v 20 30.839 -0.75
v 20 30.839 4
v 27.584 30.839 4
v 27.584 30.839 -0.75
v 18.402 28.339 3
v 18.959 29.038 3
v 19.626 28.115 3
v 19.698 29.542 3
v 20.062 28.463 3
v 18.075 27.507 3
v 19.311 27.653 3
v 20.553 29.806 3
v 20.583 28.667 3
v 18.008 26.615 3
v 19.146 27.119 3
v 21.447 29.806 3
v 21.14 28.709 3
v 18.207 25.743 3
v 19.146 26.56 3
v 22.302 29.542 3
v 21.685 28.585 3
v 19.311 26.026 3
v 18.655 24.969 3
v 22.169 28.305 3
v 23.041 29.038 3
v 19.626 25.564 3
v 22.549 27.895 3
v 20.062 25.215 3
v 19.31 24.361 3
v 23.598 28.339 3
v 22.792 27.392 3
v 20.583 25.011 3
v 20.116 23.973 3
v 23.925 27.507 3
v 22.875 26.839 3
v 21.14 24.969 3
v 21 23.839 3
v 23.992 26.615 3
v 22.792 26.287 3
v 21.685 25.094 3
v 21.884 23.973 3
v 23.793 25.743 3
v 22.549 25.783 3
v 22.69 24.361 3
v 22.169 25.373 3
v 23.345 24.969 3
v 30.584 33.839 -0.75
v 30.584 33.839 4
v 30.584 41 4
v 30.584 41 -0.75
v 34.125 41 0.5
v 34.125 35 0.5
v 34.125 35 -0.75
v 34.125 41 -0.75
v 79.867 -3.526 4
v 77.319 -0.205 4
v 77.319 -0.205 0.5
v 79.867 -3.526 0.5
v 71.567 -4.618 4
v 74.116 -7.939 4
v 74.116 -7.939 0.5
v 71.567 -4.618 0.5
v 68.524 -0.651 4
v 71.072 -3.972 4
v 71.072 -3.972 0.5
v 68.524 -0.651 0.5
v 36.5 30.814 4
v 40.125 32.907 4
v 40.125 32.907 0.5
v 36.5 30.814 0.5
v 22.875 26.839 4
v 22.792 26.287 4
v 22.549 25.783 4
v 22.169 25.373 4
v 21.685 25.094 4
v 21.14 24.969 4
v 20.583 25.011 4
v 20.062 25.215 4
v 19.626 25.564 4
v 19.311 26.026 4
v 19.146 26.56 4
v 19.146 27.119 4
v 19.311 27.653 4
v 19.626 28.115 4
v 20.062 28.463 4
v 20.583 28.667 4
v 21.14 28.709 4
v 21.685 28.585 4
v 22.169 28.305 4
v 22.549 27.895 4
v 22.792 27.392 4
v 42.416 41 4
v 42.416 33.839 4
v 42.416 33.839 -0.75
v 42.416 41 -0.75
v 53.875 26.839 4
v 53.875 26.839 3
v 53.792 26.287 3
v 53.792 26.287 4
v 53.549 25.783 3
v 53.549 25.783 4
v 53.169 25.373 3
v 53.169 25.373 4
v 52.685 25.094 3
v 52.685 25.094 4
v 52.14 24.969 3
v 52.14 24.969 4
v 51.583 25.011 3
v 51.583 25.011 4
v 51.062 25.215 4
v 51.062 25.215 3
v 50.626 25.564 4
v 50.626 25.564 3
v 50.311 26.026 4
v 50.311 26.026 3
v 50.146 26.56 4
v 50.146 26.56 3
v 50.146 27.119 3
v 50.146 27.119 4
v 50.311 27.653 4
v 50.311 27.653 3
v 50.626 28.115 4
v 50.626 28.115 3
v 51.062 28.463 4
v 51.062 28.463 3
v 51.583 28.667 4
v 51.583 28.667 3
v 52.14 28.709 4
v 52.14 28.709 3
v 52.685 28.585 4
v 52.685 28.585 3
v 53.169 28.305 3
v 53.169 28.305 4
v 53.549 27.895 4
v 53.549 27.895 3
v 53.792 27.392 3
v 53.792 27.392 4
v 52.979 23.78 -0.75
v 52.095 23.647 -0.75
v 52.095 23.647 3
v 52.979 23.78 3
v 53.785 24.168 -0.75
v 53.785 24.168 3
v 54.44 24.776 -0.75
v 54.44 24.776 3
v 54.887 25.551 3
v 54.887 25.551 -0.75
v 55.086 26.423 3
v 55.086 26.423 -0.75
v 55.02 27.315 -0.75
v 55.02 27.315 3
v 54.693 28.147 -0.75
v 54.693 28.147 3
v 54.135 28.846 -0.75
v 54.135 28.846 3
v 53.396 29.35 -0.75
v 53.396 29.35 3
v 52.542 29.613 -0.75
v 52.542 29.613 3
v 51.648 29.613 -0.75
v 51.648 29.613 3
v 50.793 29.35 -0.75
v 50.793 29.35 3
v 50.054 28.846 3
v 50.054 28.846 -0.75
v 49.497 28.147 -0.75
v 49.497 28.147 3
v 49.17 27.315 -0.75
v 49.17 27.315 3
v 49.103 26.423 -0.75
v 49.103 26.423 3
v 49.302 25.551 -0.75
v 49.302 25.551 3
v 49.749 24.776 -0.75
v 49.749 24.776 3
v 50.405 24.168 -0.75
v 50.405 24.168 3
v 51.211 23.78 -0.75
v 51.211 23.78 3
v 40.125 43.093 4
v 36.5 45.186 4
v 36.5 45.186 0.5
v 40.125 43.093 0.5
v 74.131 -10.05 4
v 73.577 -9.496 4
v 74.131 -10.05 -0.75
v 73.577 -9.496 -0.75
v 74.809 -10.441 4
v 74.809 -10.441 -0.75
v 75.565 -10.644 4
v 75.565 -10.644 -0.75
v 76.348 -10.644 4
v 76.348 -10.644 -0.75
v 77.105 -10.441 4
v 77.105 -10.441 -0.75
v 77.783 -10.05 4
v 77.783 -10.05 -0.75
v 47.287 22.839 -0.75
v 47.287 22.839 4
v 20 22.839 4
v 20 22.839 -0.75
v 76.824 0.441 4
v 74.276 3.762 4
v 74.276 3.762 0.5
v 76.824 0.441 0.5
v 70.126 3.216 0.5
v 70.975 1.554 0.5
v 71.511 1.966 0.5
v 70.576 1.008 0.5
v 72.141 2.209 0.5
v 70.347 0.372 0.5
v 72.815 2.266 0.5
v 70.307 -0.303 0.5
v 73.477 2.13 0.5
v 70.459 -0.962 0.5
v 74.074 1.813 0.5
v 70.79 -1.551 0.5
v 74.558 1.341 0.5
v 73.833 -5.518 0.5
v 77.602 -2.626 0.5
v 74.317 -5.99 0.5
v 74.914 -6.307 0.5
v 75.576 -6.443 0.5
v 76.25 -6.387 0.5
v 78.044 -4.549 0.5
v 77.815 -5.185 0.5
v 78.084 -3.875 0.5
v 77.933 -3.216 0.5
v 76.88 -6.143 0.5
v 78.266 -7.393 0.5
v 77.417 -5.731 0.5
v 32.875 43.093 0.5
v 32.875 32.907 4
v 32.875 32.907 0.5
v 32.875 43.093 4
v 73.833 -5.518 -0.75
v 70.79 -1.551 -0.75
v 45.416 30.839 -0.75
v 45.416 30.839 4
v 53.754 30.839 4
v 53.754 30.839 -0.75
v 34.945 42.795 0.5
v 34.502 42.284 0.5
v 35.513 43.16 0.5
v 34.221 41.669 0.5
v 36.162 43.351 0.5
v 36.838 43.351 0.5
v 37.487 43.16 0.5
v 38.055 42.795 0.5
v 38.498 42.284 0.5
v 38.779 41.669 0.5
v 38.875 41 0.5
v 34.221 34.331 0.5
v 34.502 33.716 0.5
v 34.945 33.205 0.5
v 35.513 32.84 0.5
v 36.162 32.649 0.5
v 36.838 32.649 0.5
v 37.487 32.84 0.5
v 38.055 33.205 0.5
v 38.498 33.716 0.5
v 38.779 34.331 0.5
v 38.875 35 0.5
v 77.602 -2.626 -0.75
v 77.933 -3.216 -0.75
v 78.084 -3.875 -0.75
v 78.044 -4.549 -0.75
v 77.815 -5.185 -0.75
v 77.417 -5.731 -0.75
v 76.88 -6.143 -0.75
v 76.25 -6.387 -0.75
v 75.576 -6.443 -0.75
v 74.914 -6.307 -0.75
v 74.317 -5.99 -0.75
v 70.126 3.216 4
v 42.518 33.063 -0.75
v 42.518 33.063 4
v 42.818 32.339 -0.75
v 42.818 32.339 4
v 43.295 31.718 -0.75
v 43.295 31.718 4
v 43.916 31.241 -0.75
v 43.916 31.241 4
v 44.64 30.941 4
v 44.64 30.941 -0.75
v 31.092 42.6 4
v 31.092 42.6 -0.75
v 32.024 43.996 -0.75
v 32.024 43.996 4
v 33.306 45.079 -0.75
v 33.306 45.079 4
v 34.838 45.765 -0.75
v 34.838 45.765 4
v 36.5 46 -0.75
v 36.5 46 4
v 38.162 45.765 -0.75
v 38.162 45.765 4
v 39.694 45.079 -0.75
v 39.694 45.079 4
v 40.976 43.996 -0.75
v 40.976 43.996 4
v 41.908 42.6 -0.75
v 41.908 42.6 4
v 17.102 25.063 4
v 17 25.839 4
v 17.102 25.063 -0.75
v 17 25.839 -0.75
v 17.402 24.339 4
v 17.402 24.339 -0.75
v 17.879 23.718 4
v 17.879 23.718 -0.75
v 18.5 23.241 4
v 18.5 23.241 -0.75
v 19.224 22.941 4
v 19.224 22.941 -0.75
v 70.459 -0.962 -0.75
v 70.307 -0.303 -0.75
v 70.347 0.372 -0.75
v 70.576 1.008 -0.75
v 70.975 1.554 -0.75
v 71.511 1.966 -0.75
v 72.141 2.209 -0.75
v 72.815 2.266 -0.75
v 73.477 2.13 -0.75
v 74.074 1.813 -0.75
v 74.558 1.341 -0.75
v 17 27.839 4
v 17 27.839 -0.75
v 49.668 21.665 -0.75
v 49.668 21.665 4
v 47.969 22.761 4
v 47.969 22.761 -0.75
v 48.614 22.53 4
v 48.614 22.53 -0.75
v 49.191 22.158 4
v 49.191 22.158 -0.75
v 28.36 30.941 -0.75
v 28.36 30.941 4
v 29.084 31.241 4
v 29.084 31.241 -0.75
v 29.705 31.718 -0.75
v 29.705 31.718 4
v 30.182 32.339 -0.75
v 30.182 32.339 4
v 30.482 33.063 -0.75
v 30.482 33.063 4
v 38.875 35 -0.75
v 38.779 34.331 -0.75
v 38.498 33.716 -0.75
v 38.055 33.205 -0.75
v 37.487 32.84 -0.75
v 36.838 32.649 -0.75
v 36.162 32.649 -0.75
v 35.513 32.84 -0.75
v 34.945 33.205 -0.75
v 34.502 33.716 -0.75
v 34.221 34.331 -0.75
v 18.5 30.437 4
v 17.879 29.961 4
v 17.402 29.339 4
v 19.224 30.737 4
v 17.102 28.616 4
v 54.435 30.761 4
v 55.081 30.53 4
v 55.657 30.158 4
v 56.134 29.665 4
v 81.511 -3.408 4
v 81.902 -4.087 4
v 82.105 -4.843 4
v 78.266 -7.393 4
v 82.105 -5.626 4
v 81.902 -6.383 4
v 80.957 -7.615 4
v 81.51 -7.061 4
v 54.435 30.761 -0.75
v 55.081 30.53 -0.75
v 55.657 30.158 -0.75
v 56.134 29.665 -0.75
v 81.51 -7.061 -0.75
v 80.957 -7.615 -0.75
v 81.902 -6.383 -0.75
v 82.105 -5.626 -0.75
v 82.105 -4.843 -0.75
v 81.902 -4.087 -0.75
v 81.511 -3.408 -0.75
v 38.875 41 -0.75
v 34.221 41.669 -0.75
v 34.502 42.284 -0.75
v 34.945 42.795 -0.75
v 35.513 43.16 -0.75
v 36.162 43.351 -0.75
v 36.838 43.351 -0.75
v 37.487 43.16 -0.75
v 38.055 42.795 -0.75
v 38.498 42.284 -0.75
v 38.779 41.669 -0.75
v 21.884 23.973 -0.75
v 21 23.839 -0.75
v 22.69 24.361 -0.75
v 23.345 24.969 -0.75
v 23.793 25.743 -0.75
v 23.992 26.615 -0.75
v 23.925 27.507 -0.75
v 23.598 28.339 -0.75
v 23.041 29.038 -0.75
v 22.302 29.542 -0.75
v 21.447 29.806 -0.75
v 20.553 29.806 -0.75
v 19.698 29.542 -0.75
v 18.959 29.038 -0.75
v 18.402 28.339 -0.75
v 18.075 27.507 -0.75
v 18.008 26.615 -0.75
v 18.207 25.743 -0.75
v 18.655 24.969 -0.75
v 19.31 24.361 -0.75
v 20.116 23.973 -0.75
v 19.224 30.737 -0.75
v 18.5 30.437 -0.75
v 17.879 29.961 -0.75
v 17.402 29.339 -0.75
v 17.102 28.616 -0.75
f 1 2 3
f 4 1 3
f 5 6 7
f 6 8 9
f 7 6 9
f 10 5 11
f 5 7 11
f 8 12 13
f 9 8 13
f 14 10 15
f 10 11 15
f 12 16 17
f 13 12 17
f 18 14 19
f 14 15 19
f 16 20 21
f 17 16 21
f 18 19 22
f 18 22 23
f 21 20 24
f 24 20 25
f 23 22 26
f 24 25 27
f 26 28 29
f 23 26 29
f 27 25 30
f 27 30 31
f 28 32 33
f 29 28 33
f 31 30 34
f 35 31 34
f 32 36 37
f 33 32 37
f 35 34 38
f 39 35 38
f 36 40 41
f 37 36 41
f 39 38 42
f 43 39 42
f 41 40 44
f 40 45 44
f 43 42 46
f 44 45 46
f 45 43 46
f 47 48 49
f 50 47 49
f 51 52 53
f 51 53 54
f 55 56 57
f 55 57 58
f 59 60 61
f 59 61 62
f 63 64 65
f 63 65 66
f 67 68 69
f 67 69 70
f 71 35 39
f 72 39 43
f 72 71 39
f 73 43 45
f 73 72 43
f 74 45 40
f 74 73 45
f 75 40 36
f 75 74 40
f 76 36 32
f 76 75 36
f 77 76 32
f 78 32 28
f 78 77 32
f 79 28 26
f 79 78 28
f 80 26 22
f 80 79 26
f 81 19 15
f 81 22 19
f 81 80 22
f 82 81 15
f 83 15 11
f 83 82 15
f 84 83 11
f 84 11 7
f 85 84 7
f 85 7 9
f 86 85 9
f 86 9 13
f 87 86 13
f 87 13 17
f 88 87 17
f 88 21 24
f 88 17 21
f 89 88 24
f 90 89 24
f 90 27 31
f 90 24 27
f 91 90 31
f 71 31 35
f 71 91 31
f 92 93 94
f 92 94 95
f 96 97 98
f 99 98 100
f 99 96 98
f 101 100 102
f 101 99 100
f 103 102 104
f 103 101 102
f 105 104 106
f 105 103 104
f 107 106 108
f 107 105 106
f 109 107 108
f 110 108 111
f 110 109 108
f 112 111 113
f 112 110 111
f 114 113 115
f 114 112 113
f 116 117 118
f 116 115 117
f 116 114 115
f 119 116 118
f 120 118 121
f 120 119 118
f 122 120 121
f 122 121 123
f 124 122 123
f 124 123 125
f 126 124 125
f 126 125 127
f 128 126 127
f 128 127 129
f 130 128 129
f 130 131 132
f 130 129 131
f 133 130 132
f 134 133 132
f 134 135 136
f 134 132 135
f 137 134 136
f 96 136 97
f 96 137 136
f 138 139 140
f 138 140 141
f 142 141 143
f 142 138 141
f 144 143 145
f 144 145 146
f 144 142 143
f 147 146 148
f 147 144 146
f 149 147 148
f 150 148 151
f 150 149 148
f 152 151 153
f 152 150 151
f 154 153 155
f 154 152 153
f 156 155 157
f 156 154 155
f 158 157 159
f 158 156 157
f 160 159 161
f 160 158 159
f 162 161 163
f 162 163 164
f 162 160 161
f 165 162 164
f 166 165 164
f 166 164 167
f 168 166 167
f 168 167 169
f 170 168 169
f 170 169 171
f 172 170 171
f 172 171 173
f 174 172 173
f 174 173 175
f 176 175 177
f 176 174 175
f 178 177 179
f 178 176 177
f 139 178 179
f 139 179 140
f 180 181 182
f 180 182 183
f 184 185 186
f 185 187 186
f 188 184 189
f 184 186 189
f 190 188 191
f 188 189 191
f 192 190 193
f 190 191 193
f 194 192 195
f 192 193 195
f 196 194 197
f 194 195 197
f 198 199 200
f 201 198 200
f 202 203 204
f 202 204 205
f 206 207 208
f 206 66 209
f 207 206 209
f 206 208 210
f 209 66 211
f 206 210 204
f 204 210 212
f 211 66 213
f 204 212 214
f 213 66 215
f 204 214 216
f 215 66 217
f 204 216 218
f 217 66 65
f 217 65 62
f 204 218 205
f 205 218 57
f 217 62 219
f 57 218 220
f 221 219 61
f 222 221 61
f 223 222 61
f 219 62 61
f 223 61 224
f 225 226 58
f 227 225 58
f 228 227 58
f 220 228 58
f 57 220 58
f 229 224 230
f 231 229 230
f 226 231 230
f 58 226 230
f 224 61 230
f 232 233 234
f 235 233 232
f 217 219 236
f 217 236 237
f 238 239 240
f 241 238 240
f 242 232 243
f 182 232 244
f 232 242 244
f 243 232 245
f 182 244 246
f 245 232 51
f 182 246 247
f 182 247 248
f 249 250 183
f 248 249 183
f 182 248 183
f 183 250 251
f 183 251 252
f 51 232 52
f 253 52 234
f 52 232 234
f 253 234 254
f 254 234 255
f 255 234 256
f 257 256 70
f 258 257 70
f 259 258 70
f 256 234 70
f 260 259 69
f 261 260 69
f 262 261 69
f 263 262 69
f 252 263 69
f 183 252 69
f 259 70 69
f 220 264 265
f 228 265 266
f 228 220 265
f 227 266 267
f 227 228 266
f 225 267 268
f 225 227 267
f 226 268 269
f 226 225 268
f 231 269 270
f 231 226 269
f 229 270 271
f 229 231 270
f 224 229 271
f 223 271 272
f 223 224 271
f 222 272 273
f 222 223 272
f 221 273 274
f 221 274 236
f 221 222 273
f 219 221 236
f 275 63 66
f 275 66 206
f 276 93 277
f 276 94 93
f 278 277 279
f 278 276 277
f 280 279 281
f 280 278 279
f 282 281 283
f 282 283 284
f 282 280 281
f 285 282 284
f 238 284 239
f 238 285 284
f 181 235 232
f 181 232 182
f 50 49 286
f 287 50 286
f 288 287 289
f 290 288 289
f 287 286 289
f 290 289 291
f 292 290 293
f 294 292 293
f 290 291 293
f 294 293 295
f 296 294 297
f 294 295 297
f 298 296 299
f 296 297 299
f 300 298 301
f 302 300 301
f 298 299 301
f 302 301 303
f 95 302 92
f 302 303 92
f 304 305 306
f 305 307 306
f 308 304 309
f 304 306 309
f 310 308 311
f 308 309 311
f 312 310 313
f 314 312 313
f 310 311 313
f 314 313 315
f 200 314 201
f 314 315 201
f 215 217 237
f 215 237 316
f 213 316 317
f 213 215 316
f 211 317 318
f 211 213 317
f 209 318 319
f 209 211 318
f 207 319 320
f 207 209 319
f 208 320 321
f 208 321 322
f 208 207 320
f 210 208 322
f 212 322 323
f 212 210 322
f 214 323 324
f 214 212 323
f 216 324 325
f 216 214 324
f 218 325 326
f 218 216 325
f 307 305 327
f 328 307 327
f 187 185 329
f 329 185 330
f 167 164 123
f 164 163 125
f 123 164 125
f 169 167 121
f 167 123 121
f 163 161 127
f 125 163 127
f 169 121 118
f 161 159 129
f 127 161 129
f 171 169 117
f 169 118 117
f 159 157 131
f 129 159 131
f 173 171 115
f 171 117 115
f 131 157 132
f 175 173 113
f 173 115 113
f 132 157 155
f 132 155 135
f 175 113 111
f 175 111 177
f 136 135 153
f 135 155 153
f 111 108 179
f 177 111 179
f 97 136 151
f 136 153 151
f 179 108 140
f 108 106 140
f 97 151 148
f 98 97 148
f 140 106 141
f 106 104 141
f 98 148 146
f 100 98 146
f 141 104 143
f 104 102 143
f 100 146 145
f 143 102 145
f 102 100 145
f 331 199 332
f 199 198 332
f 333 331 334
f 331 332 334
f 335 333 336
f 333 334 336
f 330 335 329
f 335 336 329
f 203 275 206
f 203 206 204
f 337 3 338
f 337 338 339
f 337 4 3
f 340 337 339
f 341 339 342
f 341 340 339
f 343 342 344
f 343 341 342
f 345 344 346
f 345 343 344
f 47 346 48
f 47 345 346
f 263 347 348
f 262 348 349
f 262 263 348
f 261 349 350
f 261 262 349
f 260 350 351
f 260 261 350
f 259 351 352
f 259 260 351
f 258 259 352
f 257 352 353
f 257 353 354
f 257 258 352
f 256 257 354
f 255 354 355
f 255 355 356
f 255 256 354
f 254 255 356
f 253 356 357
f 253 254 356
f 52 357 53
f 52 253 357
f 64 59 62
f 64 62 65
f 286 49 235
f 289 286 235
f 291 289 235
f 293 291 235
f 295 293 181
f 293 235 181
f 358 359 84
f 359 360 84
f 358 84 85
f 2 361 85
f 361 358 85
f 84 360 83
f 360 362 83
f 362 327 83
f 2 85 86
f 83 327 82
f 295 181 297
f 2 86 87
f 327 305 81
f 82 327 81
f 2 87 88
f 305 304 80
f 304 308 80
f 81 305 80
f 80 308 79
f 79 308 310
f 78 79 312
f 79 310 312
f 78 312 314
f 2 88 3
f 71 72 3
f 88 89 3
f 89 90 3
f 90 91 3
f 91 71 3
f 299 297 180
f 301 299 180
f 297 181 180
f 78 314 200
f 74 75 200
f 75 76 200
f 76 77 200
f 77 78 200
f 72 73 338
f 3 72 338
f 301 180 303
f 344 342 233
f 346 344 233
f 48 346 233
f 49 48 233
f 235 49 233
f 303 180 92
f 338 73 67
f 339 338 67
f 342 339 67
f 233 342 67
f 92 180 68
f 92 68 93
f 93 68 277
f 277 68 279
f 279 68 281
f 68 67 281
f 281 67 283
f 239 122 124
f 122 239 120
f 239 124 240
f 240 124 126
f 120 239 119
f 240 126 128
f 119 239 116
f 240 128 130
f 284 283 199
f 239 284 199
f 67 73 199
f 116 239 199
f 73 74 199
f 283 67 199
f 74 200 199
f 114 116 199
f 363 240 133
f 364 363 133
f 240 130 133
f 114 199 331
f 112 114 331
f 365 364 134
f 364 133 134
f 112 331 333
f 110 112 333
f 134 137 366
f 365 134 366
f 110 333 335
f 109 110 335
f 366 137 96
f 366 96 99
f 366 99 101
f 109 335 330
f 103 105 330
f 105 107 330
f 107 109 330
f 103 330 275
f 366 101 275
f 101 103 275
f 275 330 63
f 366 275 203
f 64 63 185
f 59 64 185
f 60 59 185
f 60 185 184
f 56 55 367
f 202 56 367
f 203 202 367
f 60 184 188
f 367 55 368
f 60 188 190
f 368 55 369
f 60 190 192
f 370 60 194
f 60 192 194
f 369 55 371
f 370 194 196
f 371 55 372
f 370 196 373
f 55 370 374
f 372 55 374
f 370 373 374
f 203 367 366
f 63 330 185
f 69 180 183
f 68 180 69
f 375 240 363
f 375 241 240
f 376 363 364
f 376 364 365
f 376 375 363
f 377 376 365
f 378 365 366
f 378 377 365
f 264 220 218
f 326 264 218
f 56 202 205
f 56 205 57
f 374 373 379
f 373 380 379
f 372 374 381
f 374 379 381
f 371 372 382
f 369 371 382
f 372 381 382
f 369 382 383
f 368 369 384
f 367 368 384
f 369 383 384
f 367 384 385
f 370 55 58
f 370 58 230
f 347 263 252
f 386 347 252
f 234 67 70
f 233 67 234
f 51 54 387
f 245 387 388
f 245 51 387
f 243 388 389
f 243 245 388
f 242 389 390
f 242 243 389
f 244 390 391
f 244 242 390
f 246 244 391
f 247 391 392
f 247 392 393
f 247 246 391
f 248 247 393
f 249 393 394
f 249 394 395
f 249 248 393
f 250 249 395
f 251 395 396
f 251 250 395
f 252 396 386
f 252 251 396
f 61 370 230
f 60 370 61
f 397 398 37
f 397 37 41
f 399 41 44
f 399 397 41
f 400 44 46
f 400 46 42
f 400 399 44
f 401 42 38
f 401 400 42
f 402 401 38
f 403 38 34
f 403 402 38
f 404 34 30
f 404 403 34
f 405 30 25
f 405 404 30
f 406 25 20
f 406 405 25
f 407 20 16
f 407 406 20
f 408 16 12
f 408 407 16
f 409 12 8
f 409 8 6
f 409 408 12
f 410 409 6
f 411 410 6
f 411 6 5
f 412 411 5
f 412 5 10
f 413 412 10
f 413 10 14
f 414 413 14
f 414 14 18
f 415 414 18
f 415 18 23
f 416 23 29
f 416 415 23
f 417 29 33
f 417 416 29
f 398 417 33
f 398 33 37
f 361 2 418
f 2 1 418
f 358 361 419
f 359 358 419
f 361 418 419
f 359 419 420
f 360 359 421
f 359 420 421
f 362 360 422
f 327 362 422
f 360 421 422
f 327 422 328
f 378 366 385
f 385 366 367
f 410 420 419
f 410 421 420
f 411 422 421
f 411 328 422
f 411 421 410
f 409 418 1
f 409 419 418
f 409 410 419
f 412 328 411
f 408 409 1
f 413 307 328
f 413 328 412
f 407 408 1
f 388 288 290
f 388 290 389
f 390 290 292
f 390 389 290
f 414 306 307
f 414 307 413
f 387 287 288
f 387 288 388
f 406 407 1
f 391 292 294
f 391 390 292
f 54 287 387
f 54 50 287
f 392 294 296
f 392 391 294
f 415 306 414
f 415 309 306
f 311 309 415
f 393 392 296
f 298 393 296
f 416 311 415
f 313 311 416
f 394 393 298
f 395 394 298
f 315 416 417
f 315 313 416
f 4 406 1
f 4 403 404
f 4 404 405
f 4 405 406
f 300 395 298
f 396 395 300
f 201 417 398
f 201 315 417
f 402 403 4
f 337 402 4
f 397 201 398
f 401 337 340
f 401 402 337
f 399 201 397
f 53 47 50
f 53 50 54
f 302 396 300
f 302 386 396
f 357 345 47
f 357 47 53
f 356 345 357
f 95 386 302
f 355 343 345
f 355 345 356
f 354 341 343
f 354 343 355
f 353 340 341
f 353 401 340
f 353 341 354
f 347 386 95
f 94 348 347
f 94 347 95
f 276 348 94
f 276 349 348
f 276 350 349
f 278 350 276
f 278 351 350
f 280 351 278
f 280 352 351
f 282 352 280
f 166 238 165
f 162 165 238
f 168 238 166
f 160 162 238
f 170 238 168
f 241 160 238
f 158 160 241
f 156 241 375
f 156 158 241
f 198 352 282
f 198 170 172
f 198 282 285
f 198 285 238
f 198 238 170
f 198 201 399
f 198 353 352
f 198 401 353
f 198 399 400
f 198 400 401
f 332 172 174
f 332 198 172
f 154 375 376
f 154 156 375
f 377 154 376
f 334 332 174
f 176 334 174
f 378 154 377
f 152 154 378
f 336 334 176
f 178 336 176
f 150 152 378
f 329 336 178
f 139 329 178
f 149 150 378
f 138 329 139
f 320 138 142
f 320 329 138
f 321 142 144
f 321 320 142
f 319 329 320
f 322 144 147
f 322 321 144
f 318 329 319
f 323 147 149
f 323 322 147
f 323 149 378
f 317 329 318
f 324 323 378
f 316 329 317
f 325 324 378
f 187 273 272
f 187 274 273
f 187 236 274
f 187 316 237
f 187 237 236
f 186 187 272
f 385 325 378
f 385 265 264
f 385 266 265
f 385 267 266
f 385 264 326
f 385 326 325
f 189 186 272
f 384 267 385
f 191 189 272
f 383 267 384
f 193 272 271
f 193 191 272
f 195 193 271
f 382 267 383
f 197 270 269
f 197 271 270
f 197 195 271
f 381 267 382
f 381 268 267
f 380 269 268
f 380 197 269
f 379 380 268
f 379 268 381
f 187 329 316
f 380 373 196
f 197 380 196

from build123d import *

# Parameters (mm, degrees)
SKETCH067_R             = 1.875
PAD035_DEPTH            = 4.75
SKETCH068_R             = 3
POCKET007018_DEPTH      = 3.75
POCKET007019_DEPTH      = 3.5
FILLET001_R             = 3
BODY008_PLACEMENT_ANGLE = 180


with BuildPart() as part:
    # Sketch067 → Pad035 (new body)
    with BuildSketch(Plane.XY.offset(-4)):
        with BuildLine():
            Line((17, -30.839247), (30.583921, -30.839247))
            Line((30.583921, -30.839247), (30.583921, -40.999999))
            ThreePointArc((30.583921, -40.999999), (36.500001, -45.999999), (42.416081, -40.999999))
            Line((42.416081, -30.839247), (42.416081, -40.999999))
            Line((42.416081, -30.839247), (55.233103, -30.839247))
            Line((55.233103, -30.839247), (83.336753, 5.788599))
            Line((83.336753, 5.788599), (75.403023, 11.875956))
            Line((75.403023, 11.875956), (48.766897, -22.839247))
            Line((48.766897, -22.839247), (17, -22.839247))
            Line((17, -22.839247), (17, -30.839247))
        make_face()
        with Locations((21, -26.839247)):
            Circle(SKETCH067_R, mode=Mode.SUBTRACT)
        with Locations((52, -26.839247)):
            Circle(SKETCH067_R, mode=Mode.SUBTRACT)
        with BuildLine():
            ThreePointArc((38.875001, -34.999999), (36.500001, -32.624999), (34.125001, -34.999999))
            Line((34.125001, -34.999999), (34.125001, -40.999999))
            ThreePointArc((34.125001, -40.999999), (36.500001, -43.374999), (38.875001, -40.999999))
            Line((38.875001, -34.999999), (38.875001, -40.999999))
        make_face(mode=Mode.SUBTRACT)
        with BuildLine():
            ThreePointArc((77.601735, 2.626292), (77.163221, 5.9563), (73.833213, 5.517786))
            Line((73.833213, 5.517786), (70.789534, 1.550921))
            ThreePointArc((70.789534, 1.550921), (71.228048, -1.779087), (74.558056, -1.340574))
            Line((77.601735, 2.626292), (74.558056, -1.340574))
        make_face(mode=Mode.SUBTRACT)
    extrude(amount=PAD035_DEPTH)

    # Sketch068 (on ShapeBinder) → Pocket007018 (cut)
    with BuildSketch(Plane(origin=(-1.5, -35, 0.75), x_dir=(0, 1, 0), z_dir=(0, 0, -1))):
        with Locations((8.353044, 53.594845)):
            Circle(SKETCH068_R)
        with Locations((8.160753, 22.5)):
            Circle(SKETCH068_R)
    extrude(amount=POCKET007018_DEPTH, mode=Mode.SUBTRACT)

    # Sketch069 → Pocket007019 (cut)
    with BuildSketch(Plane.XY.offset(-4)):
        Polygon((40.125001, -37.092894), (40.125001, -32.907104), (36.500001, -30.814209), (32.875001, -32.907104), (32.875001, -37.092894), (32.875001, -38.907104), (32.875001, -43.092894), (36.500001, -45.185788), (40.125001, -43.092894), (40.125001, -38.907104), align=None)
        Polygon((77.319431, 0.204926), (79.867471, 3.525818), (78.265513, 7.392932), (74.115516, 7.939152), (71.567477, 4.61826), (71.071837, 3.972287), (68.523798, 0.651395), (70.125755, -3.215719), (74.275752, -3.76194), (76.823792, -0.441047), align=None)
    extrude(amount=POCKET007019_DEPTH, mode=Mode.SUBTRACT)

    # Fillet001
    fillet001_edges = [part.edges().sort_by_distance(p)[0] for p in [
        (42.416081, -30.839247, -1.625),
        (55.233103, -30.839247, -1.625),
        (83.336753, 5.788599, -1.625),
        (75.403023, 11.875956, -1.625),
        (48.766897, -22.839247, -1.625),
        (17, -22.839247, -1.625),
        (17, -30.839247, -1.625),
        (30.583921, -30.839247, -1.625),
    ]]
    fillet(fillet001_edges, radius=FILLET001_R)


with BuildPart() as part_1:
    # Body008 placement: moved
    add(part.part.rotate(Axis((0, 0, 0), (1, 0, 0)), BODY008_PLACEMENT_ANGLE))


solid = part_1.part
